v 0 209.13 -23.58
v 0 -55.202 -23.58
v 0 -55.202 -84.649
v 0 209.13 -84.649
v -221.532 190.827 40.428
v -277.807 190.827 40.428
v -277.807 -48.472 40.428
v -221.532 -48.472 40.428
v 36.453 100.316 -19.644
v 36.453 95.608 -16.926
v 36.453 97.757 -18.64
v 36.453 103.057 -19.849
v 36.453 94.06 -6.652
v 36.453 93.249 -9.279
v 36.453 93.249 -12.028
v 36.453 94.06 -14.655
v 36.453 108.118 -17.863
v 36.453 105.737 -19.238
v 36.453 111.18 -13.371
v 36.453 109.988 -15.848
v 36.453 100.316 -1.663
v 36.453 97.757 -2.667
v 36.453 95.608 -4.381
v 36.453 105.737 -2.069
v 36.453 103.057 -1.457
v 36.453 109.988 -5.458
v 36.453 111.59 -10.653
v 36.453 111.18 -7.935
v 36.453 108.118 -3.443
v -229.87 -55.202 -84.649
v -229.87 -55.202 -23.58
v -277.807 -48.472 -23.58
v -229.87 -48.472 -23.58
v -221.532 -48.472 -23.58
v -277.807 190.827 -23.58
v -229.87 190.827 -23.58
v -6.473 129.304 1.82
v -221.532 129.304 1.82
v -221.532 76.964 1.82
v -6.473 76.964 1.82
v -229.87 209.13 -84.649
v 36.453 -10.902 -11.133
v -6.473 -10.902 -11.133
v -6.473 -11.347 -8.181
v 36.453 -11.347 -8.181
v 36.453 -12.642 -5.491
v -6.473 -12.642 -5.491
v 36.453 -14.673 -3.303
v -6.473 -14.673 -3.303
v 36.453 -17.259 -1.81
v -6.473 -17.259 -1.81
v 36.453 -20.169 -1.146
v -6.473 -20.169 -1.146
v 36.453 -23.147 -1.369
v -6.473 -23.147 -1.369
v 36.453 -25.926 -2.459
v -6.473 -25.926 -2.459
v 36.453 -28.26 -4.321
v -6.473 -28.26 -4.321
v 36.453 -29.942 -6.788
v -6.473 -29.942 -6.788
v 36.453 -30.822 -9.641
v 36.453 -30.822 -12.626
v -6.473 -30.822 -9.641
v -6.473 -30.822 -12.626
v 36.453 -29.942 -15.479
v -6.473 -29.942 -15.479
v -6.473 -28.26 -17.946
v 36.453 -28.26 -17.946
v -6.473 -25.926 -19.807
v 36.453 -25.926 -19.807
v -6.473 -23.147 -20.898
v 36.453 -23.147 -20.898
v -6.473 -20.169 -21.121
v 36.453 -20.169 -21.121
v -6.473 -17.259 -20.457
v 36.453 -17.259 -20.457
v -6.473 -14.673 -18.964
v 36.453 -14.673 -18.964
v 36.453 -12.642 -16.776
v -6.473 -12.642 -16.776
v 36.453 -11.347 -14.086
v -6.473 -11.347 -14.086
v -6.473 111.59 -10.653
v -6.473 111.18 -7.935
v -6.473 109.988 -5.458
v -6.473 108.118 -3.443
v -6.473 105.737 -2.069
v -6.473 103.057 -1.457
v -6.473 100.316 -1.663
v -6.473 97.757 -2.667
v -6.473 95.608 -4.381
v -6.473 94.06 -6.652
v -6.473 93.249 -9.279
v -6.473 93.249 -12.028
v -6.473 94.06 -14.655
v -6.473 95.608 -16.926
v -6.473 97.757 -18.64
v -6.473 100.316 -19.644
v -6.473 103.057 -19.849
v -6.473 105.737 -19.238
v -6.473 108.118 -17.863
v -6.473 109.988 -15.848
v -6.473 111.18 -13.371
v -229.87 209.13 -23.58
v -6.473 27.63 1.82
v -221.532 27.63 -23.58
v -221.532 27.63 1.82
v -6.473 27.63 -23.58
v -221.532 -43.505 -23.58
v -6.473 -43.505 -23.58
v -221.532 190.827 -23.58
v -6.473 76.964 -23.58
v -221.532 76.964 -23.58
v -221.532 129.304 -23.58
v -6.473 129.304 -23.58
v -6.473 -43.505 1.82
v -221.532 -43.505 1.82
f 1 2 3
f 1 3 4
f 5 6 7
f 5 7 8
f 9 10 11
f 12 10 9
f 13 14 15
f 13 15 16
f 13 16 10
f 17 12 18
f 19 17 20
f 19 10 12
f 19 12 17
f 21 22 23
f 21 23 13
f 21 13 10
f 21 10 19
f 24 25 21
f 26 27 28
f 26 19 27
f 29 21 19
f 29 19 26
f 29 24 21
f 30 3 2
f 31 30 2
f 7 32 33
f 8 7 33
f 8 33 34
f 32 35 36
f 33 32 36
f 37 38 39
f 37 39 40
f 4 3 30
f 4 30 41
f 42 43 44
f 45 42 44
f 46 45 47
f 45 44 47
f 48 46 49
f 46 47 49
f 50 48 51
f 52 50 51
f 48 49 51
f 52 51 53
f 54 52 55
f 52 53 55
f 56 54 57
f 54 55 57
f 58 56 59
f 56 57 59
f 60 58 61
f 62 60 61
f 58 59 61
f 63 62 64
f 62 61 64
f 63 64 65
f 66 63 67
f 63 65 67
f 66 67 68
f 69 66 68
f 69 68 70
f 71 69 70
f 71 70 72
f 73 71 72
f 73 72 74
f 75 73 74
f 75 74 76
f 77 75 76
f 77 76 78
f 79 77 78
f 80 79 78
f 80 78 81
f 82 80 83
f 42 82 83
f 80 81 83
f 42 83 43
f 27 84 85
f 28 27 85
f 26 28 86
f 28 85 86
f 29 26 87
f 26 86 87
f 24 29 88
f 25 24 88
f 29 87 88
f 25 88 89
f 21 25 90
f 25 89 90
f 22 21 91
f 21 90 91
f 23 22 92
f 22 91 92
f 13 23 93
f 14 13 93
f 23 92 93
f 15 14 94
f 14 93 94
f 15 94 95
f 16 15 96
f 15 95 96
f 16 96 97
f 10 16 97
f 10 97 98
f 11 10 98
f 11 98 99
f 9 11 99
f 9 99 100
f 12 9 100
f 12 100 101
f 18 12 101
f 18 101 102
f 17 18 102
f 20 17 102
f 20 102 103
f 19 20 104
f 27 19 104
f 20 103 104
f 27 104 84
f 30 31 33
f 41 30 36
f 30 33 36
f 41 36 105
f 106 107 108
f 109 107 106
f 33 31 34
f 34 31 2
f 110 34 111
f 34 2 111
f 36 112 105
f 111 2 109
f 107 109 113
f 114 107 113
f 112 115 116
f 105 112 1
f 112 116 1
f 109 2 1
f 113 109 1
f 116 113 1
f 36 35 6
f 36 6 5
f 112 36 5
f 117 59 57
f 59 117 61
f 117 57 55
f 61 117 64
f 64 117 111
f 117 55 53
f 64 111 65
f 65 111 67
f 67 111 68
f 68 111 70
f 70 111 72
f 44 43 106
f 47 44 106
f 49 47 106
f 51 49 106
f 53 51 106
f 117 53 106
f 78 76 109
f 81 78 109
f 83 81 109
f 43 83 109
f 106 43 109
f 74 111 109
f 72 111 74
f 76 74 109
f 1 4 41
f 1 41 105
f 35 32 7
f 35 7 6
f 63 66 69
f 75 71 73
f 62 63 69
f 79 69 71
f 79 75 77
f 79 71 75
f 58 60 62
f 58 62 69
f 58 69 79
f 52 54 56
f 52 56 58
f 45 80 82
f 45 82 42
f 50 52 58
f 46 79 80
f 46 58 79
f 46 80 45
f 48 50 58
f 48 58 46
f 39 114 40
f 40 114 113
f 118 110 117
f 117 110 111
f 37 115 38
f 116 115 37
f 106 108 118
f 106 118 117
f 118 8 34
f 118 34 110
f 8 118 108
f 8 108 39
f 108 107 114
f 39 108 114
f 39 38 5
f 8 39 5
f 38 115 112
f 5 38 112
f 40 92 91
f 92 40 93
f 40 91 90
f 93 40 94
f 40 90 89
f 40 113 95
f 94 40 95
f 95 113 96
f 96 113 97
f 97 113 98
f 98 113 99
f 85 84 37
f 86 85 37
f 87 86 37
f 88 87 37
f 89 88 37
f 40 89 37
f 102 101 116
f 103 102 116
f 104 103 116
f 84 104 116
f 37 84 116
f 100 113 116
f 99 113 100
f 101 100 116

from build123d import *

# Parameters (mm, degrees)
F0_W     = 264.3314376473
F0_H     = 61.0694549978
F1_DEPTH = 229.87
F2_W     = 56.2751591206
F2_H     = 239.2987646163
F3_DEPTH = 64.008
F4_W     = 215.0589334778
F4_H     = 71.1349770427
F4_H_2   = 52.3396320641
F5_DEPTH = 25.4
F6_R     = 10.0158804511
F6_R_2   = 9.2218909308
F7_DEPTH = 42.926


with BuildPart() as f1:
    # F0 (on Right) → F1 (new body)
    with BuildSketch(Plane.YZ):
        with Locations((76.9639723003, -54.1143957525)):
            Rectangle(F0_W, F0_H)
    extrude(amount=-F1_DEPTH)

    # F2 (on face) → F3 (join)
    with BuildSketch(Plane.XY.offset(-23.5796682537)):
        with Locations((-249.6691197157, 71.1772423238)):
            Rectangle(F2_W, F2_H)
    extrude(amount=F3_DEPTH)

    # F4 (on face) → F5 (join)
    with BuildSketch(Plane.XY.offset(-23.5796682537)):
        with Locations((-114.0020734165, -7.937643677)):
            Rectangle(F4_W, F4_H)
        with Locations((-114.0020734165, 103.1337883323)):
            Rectangle(F4_W, F4_H_2)
    extrude(amount=F5_DEPTH)

    # F6 (on face) → F7 (join)
    with BuildSketch(Plane.YZ.offset(-6.4726066776)):
        with Locations((-20.9178049117, -11.1334202811)):
            Circle(F6_R)
        with Locations((102.3681536317, -10.6532974169)):
            Circle(F6_R_2)
    extrude(amount=F7_DEPTH)


solid = f1.part
